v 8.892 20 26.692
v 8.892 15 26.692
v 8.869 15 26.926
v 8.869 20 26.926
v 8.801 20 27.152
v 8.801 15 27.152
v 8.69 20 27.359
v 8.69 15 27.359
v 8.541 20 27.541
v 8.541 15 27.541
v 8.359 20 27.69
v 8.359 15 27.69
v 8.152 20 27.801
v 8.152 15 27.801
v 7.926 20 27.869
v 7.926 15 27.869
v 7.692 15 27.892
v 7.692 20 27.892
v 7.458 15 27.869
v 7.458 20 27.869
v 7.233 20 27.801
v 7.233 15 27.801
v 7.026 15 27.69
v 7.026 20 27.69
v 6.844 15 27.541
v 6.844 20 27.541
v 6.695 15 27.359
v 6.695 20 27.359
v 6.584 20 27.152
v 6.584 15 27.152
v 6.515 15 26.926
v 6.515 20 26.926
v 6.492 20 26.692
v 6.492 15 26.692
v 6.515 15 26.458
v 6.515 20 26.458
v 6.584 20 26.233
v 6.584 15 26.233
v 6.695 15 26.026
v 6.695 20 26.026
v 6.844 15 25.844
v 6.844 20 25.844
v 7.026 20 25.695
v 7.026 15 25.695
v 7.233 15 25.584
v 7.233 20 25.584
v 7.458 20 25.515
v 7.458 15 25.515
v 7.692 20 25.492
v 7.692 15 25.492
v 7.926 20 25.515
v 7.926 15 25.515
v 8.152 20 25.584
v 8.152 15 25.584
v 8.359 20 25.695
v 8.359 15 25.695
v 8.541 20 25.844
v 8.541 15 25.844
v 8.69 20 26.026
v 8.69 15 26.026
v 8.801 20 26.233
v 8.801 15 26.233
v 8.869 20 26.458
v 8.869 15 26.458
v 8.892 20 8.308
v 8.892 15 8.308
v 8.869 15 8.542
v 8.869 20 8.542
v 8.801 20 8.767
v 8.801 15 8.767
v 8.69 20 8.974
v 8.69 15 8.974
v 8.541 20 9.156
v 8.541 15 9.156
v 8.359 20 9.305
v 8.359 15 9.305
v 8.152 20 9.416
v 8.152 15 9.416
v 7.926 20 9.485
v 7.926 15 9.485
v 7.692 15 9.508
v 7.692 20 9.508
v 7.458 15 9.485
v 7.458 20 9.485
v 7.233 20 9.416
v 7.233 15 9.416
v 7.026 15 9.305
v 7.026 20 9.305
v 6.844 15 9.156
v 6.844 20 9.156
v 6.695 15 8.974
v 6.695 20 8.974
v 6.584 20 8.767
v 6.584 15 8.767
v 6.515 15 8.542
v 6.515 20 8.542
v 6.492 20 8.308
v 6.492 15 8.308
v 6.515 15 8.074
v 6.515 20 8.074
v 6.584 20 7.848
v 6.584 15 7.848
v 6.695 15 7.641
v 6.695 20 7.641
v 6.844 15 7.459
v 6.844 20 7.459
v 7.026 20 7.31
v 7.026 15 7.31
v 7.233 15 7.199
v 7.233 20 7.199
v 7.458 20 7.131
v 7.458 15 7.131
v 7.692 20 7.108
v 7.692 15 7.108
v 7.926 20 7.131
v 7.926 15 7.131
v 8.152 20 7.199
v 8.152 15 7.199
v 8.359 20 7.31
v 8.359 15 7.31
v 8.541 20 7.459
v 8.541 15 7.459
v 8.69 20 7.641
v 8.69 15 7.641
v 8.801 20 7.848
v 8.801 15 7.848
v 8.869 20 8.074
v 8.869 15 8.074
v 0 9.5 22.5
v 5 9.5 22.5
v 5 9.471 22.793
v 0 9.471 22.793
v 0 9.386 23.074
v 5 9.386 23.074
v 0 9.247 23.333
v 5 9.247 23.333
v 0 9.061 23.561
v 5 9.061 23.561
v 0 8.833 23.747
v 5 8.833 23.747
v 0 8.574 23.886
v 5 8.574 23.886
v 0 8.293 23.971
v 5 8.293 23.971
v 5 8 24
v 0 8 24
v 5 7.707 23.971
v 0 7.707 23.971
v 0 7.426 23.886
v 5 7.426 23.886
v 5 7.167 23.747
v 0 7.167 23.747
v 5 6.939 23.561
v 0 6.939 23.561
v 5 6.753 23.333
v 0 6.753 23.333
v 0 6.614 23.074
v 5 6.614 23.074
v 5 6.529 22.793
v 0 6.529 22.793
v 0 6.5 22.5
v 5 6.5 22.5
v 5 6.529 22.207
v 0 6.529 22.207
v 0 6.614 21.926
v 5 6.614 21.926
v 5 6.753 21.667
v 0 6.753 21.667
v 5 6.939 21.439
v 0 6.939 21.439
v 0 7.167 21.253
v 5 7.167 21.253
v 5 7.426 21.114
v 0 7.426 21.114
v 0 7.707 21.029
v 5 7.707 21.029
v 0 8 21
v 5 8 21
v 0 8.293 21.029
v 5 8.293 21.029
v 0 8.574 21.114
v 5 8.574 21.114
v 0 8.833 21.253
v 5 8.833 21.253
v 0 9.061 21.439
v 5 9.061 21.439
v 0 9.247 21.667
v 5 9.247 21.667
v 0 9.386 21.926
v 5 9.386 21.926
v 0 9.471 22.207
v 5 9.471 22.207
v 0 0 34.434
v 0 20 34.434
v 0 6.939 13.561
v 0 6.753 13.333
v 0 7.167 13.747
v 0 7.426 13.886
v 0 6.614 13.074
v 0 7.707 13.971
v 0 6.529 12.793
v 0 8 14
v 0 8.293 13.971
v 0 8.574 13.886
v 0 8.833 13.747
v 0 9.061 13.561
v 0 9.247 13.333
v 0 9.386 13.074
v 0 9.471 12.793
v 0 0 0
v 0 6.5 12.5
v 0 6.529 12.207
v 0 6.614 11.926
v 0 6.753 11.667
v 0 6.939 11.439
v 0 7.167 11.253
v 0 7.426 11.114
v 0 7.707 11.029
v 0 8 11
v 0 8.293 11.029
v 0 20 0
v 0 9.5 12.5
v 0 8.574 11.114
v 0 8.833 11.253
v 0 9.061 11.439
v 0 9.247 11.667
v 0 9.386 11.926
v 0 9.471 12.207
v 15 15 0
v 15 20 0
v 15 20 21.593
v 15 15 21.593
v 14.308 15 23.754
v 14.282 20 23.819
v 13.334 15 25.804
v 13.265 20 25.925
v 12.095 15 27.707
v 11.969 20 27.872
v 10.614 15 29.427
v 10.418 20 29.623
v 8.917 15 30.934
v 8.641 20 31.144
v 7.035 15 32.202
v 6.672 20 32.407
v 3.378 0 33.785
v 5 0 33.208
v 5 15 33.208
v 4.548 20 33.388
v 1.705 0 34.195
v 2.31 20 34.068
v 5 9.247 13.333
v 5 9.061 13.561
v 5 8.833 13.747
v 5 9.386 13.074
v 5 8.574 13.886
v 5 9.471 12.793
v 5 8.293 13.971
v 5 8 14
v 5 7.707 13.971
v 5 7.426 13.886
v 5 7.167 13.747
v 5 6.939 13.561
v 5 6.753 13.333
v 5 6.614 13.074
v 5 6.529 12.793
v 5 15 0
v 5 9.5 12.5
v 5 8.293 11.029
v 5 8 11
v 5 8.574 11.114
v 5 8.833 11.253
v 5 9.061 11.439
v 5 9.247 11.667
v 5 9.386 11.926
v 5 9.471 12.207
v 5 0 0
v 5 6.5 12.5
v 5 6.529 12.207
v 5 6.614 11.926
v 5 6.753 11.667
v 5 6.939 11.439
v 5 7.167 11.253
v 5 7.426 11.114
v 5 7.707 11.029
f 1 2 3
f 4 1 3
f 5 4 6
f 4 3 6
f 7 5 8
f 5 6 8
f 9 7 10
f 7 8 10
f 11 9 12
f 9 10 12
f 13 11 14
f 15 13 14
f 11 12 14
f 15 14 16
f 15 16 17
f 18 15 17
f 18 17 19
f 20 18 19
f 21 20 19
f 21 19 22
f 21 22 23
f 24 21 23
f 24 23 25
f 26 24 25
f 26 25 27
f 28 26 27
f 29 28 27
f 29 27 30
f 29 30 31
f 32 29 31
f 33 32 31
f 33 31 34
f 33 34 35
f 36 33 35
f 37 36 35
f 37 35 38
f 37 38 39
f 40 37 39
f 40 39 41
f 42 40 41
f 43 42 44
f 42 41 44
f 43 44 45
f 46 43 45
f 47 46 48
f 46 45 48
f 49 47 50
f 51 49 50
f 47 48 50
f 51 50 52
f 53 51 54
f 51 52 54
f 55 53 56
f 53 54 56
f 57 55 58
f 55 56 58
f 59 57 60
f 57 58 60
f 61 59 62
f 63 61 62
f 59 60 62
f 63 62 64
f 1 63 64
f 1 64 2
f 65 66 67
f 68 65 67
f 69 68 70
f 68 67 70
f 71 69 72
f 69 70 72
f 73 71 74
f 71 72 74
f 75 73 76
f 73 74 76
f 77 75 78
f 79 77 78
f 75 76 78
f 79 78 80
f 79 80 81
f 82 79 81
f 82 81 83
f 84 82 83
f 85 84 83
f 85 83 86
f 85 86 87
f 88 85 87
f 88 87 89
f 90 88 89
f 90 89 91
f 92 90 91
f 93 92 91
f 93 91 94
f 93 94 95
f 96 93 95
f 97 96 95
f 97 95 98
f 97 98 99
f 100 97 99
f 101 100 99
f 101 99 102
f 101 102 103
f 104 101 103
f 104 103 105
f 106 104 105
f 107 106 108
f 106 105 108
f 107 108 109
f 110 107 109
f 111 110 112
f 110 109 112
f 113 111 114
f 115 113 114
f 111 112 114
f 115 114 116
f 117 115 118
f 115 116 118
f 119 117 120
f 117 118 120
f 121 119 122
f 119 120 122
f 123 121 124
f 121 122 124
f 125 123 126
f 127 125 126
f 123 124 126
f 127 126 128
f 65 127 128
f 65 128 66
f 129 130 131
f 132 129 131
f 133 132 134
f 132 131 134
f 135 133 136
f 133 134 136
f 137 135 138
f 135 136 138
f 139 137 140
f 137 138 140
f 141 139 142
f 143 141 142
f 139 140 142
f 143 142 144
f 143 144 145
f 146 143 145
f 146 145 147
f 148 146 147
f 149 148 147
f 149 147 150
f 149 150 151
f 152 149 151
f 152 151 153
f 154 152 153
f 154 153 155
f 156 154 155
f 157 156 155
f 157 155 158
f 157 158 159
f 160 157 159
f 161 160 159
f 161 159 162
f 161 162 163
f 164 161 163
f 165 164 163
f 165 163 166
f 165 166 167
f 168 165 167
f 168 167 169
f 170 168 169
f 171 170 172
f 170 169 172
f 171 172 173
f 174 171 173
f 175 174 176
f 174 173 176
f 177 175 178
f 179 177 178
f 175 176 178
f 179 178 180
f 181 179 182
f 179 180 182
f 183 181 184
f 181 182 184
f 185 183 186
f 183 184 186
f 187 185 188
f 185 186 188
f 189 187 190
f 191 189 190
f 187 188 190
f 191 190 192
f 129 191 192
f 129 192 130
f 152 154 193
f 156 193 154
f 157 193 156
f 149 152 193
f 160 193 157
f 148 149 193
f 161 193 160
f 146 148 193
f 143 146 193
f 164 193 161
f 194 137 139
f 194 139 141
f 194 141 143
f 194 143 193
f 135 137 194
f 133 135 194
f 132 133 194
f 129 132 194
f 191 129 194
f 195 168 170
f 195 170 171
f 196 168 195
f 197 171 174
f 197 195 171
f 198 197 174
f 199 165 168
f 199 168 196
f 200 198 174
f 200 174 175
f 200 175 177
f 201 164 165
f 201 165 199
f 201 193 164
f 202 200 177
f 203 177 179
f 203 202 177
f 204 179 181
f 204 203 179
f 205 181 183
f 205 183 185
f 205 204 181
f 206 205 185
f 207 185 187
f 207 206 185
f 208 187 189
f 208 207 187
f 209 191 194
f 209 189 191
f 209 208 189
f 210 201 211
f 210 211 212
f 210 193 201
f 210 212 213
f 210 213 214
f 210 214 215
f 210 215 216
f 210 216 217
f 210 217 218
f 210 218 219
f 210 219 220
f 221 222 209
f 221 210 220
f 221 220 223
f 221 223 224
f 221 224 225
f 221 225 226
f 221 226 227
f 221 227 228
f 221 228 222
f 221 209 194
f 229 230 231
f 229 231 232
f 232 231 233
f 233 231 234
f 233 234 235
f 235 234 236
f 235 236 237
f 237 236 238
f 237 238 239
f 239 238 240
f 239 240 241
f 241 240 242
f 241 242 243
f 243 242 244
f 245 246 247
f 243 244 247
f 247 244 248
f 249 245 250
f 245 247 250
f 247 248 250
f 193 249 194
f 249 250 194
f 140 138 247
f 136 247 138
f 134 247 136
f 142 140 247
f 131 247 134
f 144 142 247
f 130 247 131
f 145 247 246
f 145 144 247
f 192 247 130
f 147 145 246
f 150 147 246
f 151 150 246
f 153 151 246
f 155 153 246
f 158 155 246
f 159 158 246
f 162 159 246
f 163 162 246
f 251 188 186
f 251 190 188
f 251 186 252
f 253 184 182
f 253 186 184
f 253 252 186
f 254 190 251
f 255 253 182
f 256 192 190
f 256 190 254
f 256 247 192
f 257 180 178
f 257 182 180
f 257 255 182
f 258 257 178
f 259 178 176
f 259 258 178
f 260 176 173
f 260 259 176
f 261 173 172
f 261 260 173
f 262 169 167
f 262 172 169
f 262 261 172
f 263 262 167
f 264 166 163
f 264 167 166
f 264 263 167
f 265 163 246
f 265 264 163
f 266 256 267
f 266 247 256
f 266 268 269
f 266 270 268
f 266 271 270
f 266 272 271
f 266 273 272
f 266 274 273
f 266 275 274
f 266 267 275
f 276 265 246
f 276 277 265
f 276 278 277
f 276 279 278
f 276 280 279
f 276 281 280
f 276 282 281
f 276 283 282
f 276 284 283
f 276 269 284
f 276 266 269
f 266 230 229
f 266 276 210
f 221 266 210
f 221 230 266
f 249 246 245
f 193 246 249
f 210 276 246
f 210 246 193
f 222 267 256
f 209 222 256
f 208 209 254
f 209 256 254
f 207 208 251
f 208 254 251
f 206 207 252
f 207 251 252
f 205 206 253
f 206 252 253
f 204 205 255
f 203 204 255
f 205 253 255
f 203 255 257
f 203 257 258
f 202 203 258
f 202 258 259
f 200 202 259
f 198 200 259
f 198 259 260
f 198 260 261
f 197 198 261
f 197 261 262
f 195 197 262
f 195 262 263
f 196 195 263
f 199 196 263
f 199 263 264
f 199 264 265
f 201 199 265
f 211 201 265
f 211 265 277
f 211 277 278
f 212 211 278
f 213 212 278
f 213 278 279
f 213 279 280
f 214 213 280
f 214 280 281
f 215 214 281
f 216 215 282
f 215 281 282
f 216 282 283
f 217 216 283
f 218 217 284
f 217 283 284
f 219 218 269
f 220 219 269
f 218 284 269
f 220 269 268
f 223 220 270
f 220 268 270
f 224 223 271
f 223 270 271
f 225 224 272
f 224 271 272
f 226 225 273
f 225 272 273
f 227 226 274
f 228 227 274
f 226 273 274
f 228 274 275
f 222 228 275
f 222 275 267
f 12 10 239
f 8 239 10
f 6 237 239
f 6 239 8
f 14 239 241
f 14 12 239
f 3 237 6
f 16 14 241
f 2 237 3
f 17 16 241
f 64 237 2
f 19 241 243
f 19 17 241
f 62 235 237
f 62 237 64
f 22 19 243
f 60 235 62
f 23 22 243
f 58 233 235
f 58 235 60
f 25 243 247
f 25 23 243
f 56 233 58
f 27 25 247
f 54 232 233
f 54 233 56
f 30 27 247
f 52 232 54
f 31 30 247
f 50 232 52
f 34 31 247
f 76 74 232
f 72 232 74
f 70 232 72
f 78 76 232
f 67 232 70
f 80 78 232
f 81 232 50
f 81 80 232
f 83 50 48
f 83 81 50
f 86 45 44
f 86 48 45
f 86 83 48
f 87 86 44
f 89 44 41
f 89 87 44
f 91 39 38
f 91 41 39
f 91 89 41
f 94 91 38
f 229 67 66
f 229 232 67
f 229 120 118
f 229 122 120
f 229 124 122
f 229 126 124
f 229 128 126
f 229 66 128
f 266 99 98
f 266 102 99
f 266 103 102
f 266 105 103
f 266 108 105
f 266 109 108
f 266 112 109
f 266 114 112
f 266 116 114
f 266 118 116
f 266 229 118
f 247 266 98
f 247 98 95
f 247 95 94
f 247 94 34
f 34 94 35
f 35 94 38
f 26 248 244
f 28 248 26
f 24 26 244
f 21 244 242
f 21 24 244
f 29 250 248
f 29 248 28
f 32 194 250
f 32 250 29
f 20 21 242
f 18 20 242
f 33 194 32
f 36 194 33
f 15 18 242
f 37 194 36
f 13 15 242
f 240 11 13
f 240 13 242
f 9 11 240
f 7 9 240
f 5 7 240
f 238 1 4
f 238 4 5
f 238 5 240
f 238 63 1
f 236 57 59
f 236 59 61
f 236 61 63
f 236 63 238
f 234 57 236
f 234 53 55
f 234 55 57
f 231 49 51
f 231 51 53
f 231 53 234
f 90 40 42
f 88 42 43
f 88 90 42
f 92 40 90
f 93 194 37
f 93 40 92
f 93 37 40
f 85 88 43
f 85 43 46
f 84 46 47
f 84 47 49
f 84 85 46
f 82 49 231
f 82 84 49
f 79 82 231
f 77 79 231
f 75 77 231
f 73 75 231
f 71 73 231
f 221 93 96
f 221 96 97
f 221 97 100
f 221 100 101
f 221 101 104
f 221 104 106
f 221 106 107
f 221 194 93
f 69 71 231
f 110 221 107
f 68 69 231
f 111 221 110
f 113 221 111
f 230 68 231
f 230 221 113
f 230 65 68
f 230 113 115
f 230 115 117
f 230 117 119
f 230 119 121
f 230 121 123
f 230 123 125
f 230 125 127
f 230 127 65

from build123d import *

# Parameters (mm, degrees)
BOSS_EXTRUDE1_DEPTH = 35
CUT_EXTRUDE1_REACH  = 42.927
SKETCH3_R           = 1.2
CUT_EXTRUDE2_REACH  = 43.533
SKETCH4_R           = 1.5
CUT_EXTRUDE4_REACH  = 45.012


with BuildPart() as part:
    # Sketch1 → Boss-Extrude1 (new body)
    with BuildSketch(Plane.XY):
        Polygon((0, 0), (0, 20), (15, 20), (15, 15), (5, 15), (5, 0), align=None)
    extrude(amount=BOSS_EXTRUDE1_DEPTH)

    # Sketch3 → Cut-Extrude1 (cut, up to next)
    with BuildSketch(Plane.XZ.offset(-15), mode=Mode.PRIVATE) as cut_extrude1_sk1:
        with Locations((7.692388155, 26.692388155)):
            Circle(SKETCH3_R)
    cut_extrude1_tool1 = extrude(cut_extrude1_sk1.sketch, amount=-CUT_EXTRUDE1_REACH, mode=Mode.PRIVATE) & part.part
    # Sketch3 → Cut-Extrude1 (cut, up to next)
    with BuildSketch(Plane.XZ.offset(-15), mode=Mode.PRIVATE) as cut_extrude1_sk2:
        with Locations((7.692388155, 8.307611845)):
            Circle(SKETCH3_R)
    cut_extrude1_tool2 = extrude(cut_extrude1_sk2.sketch, amount=-CUT_EXTRUDE1_REACH, mode=Mode.PRIVATE) & part.part
    add(cut_extrude1_tool1.solids().sort_by_distance((7.692388, 15, 26.692388))[0], mode=Mode.SUBTRACT)
    add(cut_extrude1_tool2.solids().sort_by_distance((7.692388, 15, 8.307612))[0], mode=Mode.SUBTRACT)

    # Sketch4 → Cut-Extrude2 (cut, up to next)
    with BuildSketch(Plane(origin=(5, 0, 0), x_dir=(0, 0, -1), z_dir=(1, 0, 0)), mode=Mode.PRIVATE) as cut_extrude2_sk1:
        with Locations(Location((-22.5, 8, 0), (0, 0, 90))):
            Circle(SKETCH4_R)
    cut_extrude2_tool1 = extrude(cut_extrude2_sk1.sketch, amount=-CUT_EXTRUDE2_REACH, mode=Mode.PRIVATE) & part.part
    # Sketch4 → Cut-Extrude2 (cut, up to next)
    with BuildSketch(Plane(origin=(5, 0, 0), x_dir=(0, 0, -1), z_dir=(1, 0, 0)), mode=Mode.PRIVATE) as cut_extrude2_sk2:
        with Locations(Location((-12.5, 8, 0), (0, 0, 90))):
            Circle(SKETCH4_R)
    cut_extrude2_tool2 = extrude(cut_extrude2_sk2.sketch, amount=-CUT_EXTRUDE2_REACH, mode=Mode.PRIVATE) & part.part
    add(cut_extrude2_tool1.solids().sort_by_distance((5, 8, 22.5))[0], mode=Mode.SUBTRACT)
    add(cut_extrude2_tool2.solids().sort_by_distance((5, 8, 12.5))[0], mode=Mode.SUBTRACT)

    # Sketch6 → Cut-Extrude4 (cut, up to next)
    with BuildSketch(Plane(origin=(0, 20, 0), x_dir=(1, 0, 0), z_dir=(0, 1, 0)), mode=Mode.PRIVATE) as cut_extrude4_sk1:
        with BuildLine():
            Line((-1.5, -34.5), (-1.5, -42.5))
            ThreePointArc((-1.5, -42.5), (16.17766953, -35.17766953), (23.5, -17.5))
            Line((23.5, -17.5), (15.5, -17.5))
            ThreePointArc((15.5, -17.5), (10.52081528, -29.52081528), (-1.5, -34.5))
        make_face()
    cut_extrude4_tool1 = extrude(cut_extrude4_sk1.sketch, amount=-CUT_EXTRUDE4_REACH, mode=Mode.PRIVATE) & part.part
    add(cut_extrude4_tool1.solids().sort_by_distance((12.030696, 20, 31.030696))[0], mode=Mode.SUBTRACT)


solid = part.part
